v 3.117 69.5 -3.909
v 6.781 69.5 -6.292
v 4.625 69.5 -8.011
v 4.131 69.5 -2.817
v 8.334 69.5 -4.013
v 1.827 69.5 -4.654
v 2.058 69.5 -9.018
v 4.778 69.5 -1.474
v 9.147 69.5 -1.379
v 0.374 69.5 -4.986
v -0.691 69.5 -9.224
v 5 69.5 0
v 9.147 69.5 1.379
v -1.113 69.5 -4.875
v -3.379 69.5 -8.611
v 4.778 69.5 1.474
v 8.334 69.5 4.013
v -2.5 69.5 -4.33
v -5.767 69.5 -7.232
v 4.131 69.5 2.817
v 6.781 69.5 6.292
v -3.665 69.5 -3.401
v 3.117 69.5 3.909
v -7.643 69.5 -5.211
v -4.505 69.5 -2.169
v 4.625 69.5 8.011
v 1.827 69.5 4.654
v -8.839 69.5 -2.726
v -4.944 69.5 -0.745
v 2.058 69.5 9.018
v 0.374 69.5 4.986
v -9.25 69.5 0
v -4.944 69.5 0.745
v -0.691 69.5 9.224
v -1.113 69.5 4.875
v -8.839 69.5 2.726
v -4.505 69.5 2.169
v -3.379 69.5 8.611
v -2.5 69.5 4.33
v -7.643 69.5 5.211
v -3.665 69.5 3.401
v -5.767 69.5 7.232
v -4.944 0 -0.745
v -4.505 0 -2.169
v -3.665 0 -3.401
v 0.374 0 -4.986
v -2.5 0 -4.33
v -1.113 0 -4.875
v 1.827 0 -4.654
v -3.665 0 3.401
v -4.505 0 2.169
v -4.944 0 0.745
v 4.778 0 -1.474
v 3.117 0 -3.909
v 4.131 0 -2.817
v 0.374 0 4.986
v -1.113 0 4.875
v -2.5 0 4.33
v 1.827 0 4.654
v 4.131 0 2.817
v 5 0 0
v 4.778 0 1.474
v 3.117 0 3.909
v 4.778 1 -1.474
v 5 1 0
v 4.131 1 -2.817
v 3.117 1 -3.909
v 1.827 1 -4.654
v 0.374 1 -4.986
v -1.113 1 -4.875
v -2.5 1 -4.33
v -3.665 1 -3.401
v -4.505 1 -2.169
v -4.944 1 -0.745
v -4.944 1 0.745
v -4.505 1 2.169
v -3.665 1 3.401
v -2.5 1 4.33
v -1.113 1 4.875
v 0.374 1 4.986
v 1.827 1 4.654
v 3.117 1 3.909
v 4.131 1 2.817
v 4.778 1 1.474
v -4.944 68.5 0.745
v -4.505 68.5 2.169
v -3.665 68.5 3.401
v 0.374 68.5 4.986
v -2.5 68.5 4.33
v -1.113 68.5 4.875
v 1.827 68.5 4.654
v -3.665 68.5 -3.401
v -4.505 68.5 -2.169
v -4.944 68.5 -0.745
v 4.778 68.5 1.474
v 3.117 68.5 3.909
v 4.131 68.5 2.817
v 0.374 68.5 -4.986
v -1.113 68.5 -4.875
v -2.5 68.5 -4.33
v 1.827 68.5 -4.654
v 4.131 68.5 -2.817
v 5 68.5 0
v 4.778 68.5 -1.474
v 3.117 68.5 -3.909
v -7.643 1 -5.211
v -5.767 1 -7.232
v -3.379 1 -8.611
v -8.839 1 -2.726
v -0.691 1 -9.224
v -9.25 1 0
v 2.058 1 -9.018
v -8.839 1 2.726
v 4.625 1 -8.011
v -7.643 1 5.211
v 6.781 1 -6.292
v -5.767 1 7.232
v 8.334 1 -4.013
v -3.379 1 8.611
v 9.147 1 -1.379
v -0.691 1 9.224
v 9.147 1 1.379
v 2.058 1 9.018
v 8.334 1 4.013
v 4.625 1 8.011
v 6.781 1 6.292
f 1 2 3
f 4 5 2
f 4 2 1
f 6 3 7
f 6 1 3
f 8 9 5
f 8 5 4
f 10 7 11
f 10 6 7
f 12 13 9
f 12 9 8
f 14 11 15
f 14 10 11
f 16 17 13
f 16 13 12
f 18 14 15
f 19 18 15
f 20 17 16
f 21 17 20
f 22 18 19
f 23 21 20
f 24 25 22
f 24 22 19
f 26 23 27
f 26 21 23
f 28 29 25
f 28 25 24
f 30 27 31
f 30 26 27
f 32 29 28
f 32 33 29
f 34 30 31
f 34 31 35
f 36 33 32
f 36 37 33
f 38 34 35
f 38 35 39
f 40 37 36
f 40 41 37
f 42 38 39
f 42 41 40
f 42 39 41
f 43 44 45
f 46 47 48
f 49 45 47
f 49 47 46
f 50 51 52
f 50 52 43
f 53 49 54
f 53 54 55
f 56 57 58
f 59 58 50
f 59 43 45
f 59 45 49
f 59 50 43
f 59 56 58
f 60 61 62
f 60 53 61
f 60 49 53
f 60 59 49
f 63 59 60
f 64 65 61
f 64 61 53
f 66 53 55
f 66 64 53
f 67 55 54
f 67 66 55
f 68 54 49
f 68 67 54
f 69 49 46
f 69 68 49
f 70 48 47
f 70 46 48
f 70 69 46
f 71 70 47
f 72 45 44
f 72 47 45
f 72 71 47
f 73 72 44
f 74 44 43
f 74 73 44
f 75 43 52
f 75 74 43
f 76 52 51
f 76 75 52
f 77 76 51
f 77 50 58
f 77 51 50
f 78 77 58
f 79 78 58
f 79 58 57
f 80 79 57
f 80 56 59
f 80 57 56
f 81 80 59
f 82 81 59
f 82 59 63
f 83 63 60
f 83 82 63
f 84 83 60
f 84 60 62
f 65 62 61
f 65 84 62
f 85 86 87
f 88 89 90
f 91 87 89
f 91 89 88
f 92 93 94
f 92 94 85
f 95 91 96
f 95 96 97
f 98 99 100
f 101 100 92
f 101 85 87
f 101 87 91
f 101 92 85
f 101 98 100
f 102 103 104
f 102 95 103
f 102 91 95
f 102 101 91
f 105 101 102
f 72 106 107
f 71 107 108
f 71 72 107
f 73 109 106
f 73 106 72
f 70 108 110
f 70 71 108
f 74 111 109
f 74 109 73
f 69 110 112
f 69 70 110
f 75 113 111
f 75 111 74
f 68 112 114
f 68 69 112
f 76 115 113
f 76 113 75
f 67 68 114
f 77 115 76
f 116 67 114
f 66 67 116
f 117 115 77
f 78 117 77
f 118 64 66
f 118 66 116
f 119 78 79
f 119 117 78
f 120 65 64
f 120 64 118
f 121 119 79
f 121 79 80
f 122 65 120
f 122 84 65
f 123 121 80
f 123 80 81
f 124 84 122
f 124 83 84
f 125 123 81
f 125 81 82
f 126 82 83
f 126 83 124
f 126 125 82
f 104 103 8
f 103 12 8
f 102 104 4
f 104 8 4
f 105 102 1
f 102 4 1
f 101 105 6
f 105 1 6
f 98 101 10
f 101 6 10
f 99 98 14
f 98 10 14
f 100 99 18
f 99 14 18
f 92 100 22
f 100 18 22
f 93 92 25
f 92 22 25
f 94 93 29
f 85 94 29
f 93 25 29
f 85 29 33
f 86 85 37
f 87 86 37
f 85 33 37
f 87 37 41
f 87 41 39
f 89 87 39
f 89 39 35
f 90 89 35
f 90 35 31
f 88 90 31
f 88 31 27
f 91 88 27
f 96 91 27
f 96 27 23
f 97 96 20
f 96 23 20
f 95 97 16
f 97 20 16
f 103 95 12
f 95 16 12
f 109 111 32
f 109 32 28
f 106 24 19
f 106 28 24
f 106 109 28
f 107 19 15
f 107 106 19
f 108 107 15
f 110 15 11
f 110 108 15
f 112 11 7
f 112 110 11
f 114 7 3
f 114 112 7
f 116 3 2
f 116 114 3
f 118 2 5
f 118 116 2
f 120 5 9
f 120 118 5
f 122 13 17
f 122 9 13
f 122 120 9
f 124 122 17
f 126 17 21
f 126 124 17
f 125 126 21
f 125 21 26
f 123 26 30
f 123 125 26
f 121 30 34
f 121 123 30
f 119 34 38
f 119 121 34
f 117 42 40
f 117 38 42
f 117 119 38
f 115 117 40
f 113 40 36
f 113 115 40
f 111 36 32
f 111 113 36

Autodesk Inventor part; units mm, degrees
ref_plane "YZ Plane" through (0, 0, 0) normal (1, 0, 0) x (0, 1, 0)
ref_plane "XZ Plane" through (0, 0, 0) normal (0, 1, 0) x (-1, 0, 0)
ref_plane "XY Plane" through (0, 0, 0) normal (0, 0, 1) x (1, 0, 0)
sketch "스케치1" plane through (0, 0, 0) normal (0, 1, 0) x (-1, 0, 0)
  circle A0 centre (0, 0) radius 9.25
  dimension "d0" = 18.5
extrude "돌출1" add sketch "스케치1" along normal blind 69.5
sketch "스케치2" plane through (0, 69.5, 0) normal (0, 1, 0) x (1, 0, 0)
  circle A0 centre (0, 0) radius 5
  dimension "d3" = 10
extrude "돌출2" cut sketch "스케치2" against normal blind 1
sketch "스케치3" plane through (0, 0, 0) normal (0, -1, 0) x (1, 0, 0)
  circle A0 centre (0, 0) radius 9.25 projected
extrude "돌출3" cut sketch "스케치3" against normal blind 1
sketch "스케치4" plane through (0, 1, 0) normal (0, -1, 0) x (1, 0, 0)
  circle A0 centre (0, 0) radius 5
  dimension "d8" = 10
extrude "돌출4" add sketch "스케치4" along normal blind 1
properties part number "건전지"
